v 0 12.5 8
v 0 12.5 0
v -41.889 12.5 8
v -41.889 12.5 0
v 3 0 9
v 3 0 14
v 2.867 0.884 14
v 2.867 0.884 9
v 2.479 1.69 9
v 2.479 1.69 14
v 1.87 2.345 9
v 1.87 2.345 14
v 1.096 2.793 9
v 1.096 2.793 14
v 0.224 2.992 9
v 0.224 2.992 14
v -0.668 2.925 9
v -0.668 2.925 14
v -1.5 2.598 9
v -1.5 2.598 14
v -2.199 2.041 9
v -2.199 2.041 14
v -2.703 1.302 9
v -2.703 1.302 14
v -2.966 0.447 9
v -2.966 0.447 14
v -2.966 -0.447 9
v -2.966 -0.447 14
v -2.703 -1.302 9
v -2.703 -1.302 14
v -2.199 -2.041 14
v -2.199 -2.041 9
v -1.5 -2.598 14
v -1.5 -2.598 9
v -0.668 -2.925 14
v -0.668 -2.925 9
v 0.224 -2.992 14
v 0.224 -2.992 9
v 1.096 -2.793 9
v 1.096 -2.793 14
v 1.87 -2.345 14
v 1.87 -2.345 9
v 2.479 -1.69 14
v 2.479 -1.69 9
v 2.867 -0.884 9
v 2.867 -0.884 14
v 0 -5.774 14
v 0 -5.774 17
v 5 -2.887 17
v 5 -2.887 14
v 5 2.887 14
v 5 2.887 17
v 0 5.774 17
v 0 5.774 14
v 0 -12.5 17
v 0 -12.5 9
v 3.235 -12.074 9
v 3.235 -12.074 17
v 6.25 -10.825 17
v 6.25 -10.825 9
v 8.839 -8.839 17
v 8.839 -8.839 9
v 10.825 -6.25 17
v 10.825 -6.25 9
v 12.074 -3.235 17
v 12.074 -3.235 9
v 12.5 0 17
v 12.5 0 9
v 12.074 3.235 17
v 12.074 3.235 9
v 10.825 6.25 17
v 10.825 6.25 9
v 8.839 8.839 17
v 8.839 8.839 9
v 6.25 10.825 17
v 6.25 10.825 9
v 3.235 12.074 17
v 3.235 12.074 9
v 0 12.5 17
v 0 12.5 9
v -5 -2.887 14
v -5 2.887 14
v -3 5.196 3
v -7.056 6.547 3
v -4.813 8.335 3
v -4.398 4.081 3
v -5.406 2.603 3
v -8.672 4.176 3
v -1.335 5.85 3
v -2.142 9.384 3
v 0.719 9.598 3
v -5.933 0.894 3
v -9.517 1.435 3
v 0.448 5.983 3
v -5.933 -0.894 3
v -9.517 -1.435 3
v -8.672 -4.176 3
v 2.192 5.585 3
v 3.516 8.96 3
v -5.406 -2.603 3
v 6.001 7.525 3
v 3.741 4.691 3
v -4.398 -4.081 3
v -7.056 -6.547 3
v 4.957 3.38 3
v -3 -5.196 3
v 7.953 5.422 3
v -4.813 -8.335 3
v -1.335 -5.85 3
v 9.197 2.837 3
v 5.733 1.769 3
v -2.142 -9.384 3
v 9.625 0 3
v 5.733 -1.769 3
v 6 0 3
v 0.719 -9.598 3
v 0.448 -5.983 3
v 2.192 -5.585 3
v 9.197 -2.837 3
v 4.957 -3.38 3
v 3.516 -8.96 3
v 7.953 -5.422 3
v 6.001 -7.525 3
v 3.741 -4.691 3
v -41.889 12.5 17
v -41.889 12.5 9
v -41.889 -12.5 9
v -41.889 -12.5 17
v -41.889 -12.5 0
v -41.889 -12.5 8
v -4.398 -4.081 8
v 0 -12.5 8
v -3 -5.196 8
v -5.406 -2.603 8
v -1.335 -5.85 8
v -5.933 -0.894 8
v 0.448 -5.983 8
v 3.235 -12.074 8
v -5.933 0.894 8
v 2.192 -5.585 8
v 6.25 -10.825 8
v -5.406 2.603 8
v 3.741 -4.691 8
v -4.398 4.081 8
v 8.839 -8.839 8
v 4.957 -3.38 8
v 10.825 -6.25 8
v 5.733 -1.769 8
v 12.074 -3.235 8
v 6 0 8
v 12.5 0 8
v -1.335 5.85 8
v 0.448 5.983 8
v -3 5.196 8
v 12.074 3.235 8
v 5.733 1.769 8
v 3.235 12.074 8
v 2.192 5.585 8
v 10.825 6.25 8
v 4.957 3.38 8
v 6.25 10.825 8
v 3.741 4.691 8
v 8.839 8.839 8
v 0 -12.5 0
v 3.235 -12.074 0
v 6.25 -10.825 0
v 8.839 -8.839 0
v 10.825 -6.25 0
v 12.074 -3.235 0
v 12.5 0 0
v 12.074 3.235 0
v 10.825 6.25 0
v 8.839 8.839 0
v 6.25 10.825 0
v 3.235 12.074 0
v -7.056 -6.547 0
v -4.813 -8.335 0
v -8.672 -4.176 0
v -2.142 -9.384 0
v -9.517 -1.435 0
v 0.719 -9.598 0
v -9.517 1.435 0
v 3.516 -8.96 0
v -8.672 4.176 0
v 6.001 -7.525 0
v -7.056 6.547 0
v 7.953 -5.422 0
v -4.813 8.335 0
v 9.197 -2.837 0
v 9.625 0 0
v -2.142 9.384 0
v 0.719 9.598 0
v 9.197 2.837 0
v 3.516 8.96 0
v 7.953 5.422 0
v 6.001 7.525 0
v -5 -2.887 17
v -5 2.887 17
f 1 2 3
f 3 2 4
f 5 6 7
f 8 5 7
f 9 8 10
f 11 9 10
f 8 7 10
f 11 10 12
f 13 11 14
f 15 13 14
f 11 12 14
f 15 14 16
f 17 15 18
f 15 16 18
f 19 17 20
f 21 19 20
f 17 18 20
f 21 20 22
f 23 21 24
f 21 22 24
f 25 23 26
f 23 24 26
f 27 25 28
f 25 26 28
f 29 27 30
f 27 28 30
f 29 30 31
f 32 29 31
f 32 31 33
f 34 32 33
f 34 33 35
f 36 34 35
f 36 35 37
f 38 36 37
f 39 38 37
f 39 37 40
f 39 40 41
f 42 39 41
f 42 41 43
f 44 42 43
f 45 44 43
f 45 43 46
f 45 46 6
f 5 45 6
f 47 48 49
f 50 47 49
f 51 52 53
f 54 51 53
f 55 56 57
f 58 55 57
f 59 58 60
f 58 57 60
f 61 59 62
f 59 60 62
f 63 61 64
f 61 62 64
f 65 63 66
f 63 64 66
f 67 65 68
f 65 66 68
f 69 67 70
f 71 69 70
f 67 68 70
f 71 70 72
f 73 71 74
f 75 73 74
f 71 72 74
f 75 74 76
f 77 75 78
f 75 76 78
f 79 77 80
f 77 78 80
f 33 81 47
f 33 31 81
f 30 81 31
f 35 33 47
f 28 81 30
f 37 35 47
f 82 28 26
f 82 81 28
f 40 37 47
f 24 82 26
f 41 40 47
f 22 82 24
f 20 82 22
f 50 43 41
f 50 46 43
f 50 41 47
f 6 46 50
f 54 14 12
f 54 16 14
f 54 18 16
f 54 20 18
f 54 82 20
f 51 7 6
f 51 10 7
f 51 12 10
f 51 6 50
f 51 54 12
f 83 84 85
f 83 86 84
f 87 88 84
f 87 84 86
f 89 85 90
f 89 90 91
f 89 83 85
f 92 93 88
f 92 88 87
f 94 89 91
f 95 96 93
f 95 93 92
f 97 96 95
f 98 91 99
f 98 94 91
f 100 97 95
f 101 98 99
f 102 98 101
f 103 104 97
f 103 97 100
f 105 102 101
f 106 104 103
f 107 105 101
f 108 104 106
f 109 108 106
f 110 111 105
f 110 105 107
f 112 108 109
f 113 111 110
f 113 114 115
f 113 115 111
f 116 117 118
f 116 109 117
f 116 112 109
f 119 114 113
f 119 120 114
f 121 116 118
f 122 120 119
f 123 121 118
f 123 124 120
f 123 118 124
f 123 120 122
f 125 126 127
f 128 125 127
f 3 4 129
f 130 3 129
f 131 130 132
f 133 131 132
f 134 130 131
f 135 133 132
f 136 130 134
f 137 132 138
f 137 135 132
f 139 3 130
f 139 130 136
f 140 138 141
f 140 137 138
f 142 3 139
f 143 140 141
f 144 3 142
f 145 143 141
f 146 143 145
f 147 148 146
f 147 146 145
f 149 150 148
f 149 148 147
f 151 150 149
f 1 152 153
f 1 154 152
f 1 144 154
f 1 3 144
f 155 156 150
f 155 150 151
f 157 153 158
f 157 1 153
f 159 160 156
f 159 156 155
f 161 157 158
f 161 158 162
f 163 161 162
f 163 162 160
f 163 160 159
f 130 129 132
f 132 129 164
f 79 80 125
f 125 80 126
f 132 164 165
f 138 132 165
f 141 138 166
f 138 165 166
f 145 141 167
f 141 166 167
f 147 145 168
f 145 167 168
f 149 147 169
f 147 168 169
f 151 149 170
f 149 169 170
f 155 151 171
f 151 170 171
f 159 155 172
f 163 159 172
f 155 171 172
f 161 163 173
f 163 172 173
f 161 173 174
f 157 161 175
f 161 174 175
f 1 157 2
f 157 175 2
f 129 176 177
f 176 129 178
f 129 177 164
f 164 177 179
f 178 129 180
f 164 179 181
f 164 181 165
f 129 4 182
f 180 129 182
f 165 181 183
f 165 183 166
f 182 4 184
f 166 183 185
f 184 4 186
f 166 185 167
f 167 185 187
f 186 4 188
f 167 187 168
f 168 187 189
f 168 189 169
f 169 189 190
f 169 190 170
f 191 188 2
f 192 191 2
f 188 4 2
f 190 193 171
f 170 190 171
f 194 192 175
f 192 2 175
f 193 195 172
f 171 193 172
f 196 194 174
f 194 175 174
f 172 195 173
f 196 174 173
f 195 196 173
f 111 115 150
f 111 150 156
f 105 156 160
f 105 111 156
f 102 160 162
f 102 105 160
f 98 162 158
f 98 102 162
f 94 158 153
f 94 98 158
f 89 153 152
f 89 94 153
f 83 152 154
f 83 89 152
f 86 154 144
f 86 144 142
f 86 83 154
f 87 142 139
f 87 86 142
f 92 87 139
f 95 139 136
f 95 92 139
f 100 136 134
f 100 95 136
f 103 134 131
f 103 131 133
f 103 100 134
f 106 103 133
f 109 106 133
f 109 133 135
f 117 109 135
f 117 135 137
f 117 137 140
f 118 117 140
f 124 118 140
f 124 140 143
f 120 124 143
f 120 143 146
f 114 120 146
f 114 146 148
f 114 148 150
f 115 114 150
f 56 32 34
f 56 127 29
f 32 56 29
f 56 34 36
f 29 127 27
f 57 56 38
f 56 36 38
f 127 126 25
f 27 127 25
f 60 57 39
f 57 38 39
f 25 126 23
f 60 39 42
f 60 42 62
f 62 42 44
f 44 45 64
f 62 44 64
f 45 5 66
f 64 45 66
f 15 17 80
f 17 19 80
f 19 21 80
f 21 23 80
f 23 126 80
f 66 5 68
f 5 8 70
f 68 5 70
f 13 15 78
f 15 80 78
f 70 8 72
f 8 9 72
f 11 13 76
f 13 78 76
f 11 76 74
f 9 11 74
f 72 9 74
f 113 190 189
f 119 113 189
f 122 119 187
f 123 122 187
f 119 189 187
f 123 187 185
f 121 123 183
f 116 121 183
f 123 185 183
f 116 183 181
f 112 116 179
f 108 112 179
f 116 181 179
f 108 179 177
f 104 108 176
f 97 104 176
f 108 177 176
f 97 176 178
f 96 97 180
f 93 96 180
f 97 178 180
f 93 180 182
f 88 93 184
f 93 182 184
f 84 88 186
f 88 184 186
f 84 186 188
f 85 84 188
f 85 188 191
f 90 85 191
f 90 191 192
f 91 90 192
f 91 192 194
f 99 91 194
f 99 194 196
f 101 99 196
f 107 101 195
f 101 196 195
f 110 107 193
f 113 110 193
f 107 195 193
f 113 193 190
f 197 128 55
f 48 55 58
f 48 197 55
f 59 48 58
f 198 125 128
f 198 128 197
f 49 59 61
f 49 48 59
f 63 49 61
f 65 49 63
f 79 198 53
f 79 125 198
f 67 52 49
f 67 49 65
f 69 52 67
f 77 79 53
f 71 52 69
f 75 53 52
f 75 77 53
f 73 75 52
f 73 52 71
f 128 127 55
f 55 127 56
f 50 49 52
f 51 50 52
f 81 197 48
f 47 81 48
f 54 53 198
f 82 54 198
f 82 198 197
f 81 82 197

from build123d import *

# Parameters (mm, degrees)
F0_R      = 6
F1_DEPTH  = 8
F2_R      = 9.625
F3_DEPTH  = 3
F6_DEPTH  = 8
F7_R      = 3
F8_DEPTH  = 17.001
F10_DEPTH = 3


with BuildPart() as f1:
    # F0 (on Top) → F1 (new body)
    with BuildSketch(Plane.XY):
        with BuildLine():
            Line((-41.8894961476, -12.5), (0, -12.5))
            ThreePointArc((0, -12.5), (12.5, 0), (0, 12.5))
            Line((0, 12.5), (-41.8894961476, 12.5))
            Line((-41.8894961476, 12.5), (-41.8894961476, -12.5))
        make_face()
        Circle(F0_R, mode=Mode.SUBTRACT)
    extrude(amount=F1_DEPTH)

    # F2 (on face) → F3 (cut)
    with BuildSketch(Plane(origin=(0, 0, 0), x_dir=(1, 0, 0), z_dir=(0, 0, -1))):
        Circle(F2_R)
    extrude(amount=-F3_DEPTH, mode=Mode.SUBTRACT)


with BuildPart() as f6:
    # F5 (on offset) → F6 (new body)
    with BuildSketch(Plane.XY.offset(9)):
        with BuildLine():
            ThreePointArc((0, -12.5), (12.5, 0), (0, 12.5))
            Line((0, 12.5), (-41.8894961476, 12.5))
            Line((-41.8894961476, 12.5), (-41.8894961476, -12.5))
            Line((-41.8894961476, -12.5), (0, -12.5))
        make_face()
    extrude(amount=F6_DEPTH)

    # F7 (on face) → F8 (cut, through all)
    with BuildSketch(Plane.XY.offset(17)):
        Circle(F7_R)
    extrude(amount=-F8_DEPTH, mode=Mode.SUBTRACT)

    # F9 (on face) → F10 (cut)
    with BuildSketch(Plane.XY.offset(17)):
        Polygon((5, -2.8867513459), (5, 2.8867513459), (0, 5.7735026919), (-5, 2.8867513459), (-5, -2.8867513459), (0, -5.7735026919), align=None)
    extrude(amount=-F10_DEPTH, mode=Mode.SUBTRACT)


solid = Compound([f1.part, f6.part])
